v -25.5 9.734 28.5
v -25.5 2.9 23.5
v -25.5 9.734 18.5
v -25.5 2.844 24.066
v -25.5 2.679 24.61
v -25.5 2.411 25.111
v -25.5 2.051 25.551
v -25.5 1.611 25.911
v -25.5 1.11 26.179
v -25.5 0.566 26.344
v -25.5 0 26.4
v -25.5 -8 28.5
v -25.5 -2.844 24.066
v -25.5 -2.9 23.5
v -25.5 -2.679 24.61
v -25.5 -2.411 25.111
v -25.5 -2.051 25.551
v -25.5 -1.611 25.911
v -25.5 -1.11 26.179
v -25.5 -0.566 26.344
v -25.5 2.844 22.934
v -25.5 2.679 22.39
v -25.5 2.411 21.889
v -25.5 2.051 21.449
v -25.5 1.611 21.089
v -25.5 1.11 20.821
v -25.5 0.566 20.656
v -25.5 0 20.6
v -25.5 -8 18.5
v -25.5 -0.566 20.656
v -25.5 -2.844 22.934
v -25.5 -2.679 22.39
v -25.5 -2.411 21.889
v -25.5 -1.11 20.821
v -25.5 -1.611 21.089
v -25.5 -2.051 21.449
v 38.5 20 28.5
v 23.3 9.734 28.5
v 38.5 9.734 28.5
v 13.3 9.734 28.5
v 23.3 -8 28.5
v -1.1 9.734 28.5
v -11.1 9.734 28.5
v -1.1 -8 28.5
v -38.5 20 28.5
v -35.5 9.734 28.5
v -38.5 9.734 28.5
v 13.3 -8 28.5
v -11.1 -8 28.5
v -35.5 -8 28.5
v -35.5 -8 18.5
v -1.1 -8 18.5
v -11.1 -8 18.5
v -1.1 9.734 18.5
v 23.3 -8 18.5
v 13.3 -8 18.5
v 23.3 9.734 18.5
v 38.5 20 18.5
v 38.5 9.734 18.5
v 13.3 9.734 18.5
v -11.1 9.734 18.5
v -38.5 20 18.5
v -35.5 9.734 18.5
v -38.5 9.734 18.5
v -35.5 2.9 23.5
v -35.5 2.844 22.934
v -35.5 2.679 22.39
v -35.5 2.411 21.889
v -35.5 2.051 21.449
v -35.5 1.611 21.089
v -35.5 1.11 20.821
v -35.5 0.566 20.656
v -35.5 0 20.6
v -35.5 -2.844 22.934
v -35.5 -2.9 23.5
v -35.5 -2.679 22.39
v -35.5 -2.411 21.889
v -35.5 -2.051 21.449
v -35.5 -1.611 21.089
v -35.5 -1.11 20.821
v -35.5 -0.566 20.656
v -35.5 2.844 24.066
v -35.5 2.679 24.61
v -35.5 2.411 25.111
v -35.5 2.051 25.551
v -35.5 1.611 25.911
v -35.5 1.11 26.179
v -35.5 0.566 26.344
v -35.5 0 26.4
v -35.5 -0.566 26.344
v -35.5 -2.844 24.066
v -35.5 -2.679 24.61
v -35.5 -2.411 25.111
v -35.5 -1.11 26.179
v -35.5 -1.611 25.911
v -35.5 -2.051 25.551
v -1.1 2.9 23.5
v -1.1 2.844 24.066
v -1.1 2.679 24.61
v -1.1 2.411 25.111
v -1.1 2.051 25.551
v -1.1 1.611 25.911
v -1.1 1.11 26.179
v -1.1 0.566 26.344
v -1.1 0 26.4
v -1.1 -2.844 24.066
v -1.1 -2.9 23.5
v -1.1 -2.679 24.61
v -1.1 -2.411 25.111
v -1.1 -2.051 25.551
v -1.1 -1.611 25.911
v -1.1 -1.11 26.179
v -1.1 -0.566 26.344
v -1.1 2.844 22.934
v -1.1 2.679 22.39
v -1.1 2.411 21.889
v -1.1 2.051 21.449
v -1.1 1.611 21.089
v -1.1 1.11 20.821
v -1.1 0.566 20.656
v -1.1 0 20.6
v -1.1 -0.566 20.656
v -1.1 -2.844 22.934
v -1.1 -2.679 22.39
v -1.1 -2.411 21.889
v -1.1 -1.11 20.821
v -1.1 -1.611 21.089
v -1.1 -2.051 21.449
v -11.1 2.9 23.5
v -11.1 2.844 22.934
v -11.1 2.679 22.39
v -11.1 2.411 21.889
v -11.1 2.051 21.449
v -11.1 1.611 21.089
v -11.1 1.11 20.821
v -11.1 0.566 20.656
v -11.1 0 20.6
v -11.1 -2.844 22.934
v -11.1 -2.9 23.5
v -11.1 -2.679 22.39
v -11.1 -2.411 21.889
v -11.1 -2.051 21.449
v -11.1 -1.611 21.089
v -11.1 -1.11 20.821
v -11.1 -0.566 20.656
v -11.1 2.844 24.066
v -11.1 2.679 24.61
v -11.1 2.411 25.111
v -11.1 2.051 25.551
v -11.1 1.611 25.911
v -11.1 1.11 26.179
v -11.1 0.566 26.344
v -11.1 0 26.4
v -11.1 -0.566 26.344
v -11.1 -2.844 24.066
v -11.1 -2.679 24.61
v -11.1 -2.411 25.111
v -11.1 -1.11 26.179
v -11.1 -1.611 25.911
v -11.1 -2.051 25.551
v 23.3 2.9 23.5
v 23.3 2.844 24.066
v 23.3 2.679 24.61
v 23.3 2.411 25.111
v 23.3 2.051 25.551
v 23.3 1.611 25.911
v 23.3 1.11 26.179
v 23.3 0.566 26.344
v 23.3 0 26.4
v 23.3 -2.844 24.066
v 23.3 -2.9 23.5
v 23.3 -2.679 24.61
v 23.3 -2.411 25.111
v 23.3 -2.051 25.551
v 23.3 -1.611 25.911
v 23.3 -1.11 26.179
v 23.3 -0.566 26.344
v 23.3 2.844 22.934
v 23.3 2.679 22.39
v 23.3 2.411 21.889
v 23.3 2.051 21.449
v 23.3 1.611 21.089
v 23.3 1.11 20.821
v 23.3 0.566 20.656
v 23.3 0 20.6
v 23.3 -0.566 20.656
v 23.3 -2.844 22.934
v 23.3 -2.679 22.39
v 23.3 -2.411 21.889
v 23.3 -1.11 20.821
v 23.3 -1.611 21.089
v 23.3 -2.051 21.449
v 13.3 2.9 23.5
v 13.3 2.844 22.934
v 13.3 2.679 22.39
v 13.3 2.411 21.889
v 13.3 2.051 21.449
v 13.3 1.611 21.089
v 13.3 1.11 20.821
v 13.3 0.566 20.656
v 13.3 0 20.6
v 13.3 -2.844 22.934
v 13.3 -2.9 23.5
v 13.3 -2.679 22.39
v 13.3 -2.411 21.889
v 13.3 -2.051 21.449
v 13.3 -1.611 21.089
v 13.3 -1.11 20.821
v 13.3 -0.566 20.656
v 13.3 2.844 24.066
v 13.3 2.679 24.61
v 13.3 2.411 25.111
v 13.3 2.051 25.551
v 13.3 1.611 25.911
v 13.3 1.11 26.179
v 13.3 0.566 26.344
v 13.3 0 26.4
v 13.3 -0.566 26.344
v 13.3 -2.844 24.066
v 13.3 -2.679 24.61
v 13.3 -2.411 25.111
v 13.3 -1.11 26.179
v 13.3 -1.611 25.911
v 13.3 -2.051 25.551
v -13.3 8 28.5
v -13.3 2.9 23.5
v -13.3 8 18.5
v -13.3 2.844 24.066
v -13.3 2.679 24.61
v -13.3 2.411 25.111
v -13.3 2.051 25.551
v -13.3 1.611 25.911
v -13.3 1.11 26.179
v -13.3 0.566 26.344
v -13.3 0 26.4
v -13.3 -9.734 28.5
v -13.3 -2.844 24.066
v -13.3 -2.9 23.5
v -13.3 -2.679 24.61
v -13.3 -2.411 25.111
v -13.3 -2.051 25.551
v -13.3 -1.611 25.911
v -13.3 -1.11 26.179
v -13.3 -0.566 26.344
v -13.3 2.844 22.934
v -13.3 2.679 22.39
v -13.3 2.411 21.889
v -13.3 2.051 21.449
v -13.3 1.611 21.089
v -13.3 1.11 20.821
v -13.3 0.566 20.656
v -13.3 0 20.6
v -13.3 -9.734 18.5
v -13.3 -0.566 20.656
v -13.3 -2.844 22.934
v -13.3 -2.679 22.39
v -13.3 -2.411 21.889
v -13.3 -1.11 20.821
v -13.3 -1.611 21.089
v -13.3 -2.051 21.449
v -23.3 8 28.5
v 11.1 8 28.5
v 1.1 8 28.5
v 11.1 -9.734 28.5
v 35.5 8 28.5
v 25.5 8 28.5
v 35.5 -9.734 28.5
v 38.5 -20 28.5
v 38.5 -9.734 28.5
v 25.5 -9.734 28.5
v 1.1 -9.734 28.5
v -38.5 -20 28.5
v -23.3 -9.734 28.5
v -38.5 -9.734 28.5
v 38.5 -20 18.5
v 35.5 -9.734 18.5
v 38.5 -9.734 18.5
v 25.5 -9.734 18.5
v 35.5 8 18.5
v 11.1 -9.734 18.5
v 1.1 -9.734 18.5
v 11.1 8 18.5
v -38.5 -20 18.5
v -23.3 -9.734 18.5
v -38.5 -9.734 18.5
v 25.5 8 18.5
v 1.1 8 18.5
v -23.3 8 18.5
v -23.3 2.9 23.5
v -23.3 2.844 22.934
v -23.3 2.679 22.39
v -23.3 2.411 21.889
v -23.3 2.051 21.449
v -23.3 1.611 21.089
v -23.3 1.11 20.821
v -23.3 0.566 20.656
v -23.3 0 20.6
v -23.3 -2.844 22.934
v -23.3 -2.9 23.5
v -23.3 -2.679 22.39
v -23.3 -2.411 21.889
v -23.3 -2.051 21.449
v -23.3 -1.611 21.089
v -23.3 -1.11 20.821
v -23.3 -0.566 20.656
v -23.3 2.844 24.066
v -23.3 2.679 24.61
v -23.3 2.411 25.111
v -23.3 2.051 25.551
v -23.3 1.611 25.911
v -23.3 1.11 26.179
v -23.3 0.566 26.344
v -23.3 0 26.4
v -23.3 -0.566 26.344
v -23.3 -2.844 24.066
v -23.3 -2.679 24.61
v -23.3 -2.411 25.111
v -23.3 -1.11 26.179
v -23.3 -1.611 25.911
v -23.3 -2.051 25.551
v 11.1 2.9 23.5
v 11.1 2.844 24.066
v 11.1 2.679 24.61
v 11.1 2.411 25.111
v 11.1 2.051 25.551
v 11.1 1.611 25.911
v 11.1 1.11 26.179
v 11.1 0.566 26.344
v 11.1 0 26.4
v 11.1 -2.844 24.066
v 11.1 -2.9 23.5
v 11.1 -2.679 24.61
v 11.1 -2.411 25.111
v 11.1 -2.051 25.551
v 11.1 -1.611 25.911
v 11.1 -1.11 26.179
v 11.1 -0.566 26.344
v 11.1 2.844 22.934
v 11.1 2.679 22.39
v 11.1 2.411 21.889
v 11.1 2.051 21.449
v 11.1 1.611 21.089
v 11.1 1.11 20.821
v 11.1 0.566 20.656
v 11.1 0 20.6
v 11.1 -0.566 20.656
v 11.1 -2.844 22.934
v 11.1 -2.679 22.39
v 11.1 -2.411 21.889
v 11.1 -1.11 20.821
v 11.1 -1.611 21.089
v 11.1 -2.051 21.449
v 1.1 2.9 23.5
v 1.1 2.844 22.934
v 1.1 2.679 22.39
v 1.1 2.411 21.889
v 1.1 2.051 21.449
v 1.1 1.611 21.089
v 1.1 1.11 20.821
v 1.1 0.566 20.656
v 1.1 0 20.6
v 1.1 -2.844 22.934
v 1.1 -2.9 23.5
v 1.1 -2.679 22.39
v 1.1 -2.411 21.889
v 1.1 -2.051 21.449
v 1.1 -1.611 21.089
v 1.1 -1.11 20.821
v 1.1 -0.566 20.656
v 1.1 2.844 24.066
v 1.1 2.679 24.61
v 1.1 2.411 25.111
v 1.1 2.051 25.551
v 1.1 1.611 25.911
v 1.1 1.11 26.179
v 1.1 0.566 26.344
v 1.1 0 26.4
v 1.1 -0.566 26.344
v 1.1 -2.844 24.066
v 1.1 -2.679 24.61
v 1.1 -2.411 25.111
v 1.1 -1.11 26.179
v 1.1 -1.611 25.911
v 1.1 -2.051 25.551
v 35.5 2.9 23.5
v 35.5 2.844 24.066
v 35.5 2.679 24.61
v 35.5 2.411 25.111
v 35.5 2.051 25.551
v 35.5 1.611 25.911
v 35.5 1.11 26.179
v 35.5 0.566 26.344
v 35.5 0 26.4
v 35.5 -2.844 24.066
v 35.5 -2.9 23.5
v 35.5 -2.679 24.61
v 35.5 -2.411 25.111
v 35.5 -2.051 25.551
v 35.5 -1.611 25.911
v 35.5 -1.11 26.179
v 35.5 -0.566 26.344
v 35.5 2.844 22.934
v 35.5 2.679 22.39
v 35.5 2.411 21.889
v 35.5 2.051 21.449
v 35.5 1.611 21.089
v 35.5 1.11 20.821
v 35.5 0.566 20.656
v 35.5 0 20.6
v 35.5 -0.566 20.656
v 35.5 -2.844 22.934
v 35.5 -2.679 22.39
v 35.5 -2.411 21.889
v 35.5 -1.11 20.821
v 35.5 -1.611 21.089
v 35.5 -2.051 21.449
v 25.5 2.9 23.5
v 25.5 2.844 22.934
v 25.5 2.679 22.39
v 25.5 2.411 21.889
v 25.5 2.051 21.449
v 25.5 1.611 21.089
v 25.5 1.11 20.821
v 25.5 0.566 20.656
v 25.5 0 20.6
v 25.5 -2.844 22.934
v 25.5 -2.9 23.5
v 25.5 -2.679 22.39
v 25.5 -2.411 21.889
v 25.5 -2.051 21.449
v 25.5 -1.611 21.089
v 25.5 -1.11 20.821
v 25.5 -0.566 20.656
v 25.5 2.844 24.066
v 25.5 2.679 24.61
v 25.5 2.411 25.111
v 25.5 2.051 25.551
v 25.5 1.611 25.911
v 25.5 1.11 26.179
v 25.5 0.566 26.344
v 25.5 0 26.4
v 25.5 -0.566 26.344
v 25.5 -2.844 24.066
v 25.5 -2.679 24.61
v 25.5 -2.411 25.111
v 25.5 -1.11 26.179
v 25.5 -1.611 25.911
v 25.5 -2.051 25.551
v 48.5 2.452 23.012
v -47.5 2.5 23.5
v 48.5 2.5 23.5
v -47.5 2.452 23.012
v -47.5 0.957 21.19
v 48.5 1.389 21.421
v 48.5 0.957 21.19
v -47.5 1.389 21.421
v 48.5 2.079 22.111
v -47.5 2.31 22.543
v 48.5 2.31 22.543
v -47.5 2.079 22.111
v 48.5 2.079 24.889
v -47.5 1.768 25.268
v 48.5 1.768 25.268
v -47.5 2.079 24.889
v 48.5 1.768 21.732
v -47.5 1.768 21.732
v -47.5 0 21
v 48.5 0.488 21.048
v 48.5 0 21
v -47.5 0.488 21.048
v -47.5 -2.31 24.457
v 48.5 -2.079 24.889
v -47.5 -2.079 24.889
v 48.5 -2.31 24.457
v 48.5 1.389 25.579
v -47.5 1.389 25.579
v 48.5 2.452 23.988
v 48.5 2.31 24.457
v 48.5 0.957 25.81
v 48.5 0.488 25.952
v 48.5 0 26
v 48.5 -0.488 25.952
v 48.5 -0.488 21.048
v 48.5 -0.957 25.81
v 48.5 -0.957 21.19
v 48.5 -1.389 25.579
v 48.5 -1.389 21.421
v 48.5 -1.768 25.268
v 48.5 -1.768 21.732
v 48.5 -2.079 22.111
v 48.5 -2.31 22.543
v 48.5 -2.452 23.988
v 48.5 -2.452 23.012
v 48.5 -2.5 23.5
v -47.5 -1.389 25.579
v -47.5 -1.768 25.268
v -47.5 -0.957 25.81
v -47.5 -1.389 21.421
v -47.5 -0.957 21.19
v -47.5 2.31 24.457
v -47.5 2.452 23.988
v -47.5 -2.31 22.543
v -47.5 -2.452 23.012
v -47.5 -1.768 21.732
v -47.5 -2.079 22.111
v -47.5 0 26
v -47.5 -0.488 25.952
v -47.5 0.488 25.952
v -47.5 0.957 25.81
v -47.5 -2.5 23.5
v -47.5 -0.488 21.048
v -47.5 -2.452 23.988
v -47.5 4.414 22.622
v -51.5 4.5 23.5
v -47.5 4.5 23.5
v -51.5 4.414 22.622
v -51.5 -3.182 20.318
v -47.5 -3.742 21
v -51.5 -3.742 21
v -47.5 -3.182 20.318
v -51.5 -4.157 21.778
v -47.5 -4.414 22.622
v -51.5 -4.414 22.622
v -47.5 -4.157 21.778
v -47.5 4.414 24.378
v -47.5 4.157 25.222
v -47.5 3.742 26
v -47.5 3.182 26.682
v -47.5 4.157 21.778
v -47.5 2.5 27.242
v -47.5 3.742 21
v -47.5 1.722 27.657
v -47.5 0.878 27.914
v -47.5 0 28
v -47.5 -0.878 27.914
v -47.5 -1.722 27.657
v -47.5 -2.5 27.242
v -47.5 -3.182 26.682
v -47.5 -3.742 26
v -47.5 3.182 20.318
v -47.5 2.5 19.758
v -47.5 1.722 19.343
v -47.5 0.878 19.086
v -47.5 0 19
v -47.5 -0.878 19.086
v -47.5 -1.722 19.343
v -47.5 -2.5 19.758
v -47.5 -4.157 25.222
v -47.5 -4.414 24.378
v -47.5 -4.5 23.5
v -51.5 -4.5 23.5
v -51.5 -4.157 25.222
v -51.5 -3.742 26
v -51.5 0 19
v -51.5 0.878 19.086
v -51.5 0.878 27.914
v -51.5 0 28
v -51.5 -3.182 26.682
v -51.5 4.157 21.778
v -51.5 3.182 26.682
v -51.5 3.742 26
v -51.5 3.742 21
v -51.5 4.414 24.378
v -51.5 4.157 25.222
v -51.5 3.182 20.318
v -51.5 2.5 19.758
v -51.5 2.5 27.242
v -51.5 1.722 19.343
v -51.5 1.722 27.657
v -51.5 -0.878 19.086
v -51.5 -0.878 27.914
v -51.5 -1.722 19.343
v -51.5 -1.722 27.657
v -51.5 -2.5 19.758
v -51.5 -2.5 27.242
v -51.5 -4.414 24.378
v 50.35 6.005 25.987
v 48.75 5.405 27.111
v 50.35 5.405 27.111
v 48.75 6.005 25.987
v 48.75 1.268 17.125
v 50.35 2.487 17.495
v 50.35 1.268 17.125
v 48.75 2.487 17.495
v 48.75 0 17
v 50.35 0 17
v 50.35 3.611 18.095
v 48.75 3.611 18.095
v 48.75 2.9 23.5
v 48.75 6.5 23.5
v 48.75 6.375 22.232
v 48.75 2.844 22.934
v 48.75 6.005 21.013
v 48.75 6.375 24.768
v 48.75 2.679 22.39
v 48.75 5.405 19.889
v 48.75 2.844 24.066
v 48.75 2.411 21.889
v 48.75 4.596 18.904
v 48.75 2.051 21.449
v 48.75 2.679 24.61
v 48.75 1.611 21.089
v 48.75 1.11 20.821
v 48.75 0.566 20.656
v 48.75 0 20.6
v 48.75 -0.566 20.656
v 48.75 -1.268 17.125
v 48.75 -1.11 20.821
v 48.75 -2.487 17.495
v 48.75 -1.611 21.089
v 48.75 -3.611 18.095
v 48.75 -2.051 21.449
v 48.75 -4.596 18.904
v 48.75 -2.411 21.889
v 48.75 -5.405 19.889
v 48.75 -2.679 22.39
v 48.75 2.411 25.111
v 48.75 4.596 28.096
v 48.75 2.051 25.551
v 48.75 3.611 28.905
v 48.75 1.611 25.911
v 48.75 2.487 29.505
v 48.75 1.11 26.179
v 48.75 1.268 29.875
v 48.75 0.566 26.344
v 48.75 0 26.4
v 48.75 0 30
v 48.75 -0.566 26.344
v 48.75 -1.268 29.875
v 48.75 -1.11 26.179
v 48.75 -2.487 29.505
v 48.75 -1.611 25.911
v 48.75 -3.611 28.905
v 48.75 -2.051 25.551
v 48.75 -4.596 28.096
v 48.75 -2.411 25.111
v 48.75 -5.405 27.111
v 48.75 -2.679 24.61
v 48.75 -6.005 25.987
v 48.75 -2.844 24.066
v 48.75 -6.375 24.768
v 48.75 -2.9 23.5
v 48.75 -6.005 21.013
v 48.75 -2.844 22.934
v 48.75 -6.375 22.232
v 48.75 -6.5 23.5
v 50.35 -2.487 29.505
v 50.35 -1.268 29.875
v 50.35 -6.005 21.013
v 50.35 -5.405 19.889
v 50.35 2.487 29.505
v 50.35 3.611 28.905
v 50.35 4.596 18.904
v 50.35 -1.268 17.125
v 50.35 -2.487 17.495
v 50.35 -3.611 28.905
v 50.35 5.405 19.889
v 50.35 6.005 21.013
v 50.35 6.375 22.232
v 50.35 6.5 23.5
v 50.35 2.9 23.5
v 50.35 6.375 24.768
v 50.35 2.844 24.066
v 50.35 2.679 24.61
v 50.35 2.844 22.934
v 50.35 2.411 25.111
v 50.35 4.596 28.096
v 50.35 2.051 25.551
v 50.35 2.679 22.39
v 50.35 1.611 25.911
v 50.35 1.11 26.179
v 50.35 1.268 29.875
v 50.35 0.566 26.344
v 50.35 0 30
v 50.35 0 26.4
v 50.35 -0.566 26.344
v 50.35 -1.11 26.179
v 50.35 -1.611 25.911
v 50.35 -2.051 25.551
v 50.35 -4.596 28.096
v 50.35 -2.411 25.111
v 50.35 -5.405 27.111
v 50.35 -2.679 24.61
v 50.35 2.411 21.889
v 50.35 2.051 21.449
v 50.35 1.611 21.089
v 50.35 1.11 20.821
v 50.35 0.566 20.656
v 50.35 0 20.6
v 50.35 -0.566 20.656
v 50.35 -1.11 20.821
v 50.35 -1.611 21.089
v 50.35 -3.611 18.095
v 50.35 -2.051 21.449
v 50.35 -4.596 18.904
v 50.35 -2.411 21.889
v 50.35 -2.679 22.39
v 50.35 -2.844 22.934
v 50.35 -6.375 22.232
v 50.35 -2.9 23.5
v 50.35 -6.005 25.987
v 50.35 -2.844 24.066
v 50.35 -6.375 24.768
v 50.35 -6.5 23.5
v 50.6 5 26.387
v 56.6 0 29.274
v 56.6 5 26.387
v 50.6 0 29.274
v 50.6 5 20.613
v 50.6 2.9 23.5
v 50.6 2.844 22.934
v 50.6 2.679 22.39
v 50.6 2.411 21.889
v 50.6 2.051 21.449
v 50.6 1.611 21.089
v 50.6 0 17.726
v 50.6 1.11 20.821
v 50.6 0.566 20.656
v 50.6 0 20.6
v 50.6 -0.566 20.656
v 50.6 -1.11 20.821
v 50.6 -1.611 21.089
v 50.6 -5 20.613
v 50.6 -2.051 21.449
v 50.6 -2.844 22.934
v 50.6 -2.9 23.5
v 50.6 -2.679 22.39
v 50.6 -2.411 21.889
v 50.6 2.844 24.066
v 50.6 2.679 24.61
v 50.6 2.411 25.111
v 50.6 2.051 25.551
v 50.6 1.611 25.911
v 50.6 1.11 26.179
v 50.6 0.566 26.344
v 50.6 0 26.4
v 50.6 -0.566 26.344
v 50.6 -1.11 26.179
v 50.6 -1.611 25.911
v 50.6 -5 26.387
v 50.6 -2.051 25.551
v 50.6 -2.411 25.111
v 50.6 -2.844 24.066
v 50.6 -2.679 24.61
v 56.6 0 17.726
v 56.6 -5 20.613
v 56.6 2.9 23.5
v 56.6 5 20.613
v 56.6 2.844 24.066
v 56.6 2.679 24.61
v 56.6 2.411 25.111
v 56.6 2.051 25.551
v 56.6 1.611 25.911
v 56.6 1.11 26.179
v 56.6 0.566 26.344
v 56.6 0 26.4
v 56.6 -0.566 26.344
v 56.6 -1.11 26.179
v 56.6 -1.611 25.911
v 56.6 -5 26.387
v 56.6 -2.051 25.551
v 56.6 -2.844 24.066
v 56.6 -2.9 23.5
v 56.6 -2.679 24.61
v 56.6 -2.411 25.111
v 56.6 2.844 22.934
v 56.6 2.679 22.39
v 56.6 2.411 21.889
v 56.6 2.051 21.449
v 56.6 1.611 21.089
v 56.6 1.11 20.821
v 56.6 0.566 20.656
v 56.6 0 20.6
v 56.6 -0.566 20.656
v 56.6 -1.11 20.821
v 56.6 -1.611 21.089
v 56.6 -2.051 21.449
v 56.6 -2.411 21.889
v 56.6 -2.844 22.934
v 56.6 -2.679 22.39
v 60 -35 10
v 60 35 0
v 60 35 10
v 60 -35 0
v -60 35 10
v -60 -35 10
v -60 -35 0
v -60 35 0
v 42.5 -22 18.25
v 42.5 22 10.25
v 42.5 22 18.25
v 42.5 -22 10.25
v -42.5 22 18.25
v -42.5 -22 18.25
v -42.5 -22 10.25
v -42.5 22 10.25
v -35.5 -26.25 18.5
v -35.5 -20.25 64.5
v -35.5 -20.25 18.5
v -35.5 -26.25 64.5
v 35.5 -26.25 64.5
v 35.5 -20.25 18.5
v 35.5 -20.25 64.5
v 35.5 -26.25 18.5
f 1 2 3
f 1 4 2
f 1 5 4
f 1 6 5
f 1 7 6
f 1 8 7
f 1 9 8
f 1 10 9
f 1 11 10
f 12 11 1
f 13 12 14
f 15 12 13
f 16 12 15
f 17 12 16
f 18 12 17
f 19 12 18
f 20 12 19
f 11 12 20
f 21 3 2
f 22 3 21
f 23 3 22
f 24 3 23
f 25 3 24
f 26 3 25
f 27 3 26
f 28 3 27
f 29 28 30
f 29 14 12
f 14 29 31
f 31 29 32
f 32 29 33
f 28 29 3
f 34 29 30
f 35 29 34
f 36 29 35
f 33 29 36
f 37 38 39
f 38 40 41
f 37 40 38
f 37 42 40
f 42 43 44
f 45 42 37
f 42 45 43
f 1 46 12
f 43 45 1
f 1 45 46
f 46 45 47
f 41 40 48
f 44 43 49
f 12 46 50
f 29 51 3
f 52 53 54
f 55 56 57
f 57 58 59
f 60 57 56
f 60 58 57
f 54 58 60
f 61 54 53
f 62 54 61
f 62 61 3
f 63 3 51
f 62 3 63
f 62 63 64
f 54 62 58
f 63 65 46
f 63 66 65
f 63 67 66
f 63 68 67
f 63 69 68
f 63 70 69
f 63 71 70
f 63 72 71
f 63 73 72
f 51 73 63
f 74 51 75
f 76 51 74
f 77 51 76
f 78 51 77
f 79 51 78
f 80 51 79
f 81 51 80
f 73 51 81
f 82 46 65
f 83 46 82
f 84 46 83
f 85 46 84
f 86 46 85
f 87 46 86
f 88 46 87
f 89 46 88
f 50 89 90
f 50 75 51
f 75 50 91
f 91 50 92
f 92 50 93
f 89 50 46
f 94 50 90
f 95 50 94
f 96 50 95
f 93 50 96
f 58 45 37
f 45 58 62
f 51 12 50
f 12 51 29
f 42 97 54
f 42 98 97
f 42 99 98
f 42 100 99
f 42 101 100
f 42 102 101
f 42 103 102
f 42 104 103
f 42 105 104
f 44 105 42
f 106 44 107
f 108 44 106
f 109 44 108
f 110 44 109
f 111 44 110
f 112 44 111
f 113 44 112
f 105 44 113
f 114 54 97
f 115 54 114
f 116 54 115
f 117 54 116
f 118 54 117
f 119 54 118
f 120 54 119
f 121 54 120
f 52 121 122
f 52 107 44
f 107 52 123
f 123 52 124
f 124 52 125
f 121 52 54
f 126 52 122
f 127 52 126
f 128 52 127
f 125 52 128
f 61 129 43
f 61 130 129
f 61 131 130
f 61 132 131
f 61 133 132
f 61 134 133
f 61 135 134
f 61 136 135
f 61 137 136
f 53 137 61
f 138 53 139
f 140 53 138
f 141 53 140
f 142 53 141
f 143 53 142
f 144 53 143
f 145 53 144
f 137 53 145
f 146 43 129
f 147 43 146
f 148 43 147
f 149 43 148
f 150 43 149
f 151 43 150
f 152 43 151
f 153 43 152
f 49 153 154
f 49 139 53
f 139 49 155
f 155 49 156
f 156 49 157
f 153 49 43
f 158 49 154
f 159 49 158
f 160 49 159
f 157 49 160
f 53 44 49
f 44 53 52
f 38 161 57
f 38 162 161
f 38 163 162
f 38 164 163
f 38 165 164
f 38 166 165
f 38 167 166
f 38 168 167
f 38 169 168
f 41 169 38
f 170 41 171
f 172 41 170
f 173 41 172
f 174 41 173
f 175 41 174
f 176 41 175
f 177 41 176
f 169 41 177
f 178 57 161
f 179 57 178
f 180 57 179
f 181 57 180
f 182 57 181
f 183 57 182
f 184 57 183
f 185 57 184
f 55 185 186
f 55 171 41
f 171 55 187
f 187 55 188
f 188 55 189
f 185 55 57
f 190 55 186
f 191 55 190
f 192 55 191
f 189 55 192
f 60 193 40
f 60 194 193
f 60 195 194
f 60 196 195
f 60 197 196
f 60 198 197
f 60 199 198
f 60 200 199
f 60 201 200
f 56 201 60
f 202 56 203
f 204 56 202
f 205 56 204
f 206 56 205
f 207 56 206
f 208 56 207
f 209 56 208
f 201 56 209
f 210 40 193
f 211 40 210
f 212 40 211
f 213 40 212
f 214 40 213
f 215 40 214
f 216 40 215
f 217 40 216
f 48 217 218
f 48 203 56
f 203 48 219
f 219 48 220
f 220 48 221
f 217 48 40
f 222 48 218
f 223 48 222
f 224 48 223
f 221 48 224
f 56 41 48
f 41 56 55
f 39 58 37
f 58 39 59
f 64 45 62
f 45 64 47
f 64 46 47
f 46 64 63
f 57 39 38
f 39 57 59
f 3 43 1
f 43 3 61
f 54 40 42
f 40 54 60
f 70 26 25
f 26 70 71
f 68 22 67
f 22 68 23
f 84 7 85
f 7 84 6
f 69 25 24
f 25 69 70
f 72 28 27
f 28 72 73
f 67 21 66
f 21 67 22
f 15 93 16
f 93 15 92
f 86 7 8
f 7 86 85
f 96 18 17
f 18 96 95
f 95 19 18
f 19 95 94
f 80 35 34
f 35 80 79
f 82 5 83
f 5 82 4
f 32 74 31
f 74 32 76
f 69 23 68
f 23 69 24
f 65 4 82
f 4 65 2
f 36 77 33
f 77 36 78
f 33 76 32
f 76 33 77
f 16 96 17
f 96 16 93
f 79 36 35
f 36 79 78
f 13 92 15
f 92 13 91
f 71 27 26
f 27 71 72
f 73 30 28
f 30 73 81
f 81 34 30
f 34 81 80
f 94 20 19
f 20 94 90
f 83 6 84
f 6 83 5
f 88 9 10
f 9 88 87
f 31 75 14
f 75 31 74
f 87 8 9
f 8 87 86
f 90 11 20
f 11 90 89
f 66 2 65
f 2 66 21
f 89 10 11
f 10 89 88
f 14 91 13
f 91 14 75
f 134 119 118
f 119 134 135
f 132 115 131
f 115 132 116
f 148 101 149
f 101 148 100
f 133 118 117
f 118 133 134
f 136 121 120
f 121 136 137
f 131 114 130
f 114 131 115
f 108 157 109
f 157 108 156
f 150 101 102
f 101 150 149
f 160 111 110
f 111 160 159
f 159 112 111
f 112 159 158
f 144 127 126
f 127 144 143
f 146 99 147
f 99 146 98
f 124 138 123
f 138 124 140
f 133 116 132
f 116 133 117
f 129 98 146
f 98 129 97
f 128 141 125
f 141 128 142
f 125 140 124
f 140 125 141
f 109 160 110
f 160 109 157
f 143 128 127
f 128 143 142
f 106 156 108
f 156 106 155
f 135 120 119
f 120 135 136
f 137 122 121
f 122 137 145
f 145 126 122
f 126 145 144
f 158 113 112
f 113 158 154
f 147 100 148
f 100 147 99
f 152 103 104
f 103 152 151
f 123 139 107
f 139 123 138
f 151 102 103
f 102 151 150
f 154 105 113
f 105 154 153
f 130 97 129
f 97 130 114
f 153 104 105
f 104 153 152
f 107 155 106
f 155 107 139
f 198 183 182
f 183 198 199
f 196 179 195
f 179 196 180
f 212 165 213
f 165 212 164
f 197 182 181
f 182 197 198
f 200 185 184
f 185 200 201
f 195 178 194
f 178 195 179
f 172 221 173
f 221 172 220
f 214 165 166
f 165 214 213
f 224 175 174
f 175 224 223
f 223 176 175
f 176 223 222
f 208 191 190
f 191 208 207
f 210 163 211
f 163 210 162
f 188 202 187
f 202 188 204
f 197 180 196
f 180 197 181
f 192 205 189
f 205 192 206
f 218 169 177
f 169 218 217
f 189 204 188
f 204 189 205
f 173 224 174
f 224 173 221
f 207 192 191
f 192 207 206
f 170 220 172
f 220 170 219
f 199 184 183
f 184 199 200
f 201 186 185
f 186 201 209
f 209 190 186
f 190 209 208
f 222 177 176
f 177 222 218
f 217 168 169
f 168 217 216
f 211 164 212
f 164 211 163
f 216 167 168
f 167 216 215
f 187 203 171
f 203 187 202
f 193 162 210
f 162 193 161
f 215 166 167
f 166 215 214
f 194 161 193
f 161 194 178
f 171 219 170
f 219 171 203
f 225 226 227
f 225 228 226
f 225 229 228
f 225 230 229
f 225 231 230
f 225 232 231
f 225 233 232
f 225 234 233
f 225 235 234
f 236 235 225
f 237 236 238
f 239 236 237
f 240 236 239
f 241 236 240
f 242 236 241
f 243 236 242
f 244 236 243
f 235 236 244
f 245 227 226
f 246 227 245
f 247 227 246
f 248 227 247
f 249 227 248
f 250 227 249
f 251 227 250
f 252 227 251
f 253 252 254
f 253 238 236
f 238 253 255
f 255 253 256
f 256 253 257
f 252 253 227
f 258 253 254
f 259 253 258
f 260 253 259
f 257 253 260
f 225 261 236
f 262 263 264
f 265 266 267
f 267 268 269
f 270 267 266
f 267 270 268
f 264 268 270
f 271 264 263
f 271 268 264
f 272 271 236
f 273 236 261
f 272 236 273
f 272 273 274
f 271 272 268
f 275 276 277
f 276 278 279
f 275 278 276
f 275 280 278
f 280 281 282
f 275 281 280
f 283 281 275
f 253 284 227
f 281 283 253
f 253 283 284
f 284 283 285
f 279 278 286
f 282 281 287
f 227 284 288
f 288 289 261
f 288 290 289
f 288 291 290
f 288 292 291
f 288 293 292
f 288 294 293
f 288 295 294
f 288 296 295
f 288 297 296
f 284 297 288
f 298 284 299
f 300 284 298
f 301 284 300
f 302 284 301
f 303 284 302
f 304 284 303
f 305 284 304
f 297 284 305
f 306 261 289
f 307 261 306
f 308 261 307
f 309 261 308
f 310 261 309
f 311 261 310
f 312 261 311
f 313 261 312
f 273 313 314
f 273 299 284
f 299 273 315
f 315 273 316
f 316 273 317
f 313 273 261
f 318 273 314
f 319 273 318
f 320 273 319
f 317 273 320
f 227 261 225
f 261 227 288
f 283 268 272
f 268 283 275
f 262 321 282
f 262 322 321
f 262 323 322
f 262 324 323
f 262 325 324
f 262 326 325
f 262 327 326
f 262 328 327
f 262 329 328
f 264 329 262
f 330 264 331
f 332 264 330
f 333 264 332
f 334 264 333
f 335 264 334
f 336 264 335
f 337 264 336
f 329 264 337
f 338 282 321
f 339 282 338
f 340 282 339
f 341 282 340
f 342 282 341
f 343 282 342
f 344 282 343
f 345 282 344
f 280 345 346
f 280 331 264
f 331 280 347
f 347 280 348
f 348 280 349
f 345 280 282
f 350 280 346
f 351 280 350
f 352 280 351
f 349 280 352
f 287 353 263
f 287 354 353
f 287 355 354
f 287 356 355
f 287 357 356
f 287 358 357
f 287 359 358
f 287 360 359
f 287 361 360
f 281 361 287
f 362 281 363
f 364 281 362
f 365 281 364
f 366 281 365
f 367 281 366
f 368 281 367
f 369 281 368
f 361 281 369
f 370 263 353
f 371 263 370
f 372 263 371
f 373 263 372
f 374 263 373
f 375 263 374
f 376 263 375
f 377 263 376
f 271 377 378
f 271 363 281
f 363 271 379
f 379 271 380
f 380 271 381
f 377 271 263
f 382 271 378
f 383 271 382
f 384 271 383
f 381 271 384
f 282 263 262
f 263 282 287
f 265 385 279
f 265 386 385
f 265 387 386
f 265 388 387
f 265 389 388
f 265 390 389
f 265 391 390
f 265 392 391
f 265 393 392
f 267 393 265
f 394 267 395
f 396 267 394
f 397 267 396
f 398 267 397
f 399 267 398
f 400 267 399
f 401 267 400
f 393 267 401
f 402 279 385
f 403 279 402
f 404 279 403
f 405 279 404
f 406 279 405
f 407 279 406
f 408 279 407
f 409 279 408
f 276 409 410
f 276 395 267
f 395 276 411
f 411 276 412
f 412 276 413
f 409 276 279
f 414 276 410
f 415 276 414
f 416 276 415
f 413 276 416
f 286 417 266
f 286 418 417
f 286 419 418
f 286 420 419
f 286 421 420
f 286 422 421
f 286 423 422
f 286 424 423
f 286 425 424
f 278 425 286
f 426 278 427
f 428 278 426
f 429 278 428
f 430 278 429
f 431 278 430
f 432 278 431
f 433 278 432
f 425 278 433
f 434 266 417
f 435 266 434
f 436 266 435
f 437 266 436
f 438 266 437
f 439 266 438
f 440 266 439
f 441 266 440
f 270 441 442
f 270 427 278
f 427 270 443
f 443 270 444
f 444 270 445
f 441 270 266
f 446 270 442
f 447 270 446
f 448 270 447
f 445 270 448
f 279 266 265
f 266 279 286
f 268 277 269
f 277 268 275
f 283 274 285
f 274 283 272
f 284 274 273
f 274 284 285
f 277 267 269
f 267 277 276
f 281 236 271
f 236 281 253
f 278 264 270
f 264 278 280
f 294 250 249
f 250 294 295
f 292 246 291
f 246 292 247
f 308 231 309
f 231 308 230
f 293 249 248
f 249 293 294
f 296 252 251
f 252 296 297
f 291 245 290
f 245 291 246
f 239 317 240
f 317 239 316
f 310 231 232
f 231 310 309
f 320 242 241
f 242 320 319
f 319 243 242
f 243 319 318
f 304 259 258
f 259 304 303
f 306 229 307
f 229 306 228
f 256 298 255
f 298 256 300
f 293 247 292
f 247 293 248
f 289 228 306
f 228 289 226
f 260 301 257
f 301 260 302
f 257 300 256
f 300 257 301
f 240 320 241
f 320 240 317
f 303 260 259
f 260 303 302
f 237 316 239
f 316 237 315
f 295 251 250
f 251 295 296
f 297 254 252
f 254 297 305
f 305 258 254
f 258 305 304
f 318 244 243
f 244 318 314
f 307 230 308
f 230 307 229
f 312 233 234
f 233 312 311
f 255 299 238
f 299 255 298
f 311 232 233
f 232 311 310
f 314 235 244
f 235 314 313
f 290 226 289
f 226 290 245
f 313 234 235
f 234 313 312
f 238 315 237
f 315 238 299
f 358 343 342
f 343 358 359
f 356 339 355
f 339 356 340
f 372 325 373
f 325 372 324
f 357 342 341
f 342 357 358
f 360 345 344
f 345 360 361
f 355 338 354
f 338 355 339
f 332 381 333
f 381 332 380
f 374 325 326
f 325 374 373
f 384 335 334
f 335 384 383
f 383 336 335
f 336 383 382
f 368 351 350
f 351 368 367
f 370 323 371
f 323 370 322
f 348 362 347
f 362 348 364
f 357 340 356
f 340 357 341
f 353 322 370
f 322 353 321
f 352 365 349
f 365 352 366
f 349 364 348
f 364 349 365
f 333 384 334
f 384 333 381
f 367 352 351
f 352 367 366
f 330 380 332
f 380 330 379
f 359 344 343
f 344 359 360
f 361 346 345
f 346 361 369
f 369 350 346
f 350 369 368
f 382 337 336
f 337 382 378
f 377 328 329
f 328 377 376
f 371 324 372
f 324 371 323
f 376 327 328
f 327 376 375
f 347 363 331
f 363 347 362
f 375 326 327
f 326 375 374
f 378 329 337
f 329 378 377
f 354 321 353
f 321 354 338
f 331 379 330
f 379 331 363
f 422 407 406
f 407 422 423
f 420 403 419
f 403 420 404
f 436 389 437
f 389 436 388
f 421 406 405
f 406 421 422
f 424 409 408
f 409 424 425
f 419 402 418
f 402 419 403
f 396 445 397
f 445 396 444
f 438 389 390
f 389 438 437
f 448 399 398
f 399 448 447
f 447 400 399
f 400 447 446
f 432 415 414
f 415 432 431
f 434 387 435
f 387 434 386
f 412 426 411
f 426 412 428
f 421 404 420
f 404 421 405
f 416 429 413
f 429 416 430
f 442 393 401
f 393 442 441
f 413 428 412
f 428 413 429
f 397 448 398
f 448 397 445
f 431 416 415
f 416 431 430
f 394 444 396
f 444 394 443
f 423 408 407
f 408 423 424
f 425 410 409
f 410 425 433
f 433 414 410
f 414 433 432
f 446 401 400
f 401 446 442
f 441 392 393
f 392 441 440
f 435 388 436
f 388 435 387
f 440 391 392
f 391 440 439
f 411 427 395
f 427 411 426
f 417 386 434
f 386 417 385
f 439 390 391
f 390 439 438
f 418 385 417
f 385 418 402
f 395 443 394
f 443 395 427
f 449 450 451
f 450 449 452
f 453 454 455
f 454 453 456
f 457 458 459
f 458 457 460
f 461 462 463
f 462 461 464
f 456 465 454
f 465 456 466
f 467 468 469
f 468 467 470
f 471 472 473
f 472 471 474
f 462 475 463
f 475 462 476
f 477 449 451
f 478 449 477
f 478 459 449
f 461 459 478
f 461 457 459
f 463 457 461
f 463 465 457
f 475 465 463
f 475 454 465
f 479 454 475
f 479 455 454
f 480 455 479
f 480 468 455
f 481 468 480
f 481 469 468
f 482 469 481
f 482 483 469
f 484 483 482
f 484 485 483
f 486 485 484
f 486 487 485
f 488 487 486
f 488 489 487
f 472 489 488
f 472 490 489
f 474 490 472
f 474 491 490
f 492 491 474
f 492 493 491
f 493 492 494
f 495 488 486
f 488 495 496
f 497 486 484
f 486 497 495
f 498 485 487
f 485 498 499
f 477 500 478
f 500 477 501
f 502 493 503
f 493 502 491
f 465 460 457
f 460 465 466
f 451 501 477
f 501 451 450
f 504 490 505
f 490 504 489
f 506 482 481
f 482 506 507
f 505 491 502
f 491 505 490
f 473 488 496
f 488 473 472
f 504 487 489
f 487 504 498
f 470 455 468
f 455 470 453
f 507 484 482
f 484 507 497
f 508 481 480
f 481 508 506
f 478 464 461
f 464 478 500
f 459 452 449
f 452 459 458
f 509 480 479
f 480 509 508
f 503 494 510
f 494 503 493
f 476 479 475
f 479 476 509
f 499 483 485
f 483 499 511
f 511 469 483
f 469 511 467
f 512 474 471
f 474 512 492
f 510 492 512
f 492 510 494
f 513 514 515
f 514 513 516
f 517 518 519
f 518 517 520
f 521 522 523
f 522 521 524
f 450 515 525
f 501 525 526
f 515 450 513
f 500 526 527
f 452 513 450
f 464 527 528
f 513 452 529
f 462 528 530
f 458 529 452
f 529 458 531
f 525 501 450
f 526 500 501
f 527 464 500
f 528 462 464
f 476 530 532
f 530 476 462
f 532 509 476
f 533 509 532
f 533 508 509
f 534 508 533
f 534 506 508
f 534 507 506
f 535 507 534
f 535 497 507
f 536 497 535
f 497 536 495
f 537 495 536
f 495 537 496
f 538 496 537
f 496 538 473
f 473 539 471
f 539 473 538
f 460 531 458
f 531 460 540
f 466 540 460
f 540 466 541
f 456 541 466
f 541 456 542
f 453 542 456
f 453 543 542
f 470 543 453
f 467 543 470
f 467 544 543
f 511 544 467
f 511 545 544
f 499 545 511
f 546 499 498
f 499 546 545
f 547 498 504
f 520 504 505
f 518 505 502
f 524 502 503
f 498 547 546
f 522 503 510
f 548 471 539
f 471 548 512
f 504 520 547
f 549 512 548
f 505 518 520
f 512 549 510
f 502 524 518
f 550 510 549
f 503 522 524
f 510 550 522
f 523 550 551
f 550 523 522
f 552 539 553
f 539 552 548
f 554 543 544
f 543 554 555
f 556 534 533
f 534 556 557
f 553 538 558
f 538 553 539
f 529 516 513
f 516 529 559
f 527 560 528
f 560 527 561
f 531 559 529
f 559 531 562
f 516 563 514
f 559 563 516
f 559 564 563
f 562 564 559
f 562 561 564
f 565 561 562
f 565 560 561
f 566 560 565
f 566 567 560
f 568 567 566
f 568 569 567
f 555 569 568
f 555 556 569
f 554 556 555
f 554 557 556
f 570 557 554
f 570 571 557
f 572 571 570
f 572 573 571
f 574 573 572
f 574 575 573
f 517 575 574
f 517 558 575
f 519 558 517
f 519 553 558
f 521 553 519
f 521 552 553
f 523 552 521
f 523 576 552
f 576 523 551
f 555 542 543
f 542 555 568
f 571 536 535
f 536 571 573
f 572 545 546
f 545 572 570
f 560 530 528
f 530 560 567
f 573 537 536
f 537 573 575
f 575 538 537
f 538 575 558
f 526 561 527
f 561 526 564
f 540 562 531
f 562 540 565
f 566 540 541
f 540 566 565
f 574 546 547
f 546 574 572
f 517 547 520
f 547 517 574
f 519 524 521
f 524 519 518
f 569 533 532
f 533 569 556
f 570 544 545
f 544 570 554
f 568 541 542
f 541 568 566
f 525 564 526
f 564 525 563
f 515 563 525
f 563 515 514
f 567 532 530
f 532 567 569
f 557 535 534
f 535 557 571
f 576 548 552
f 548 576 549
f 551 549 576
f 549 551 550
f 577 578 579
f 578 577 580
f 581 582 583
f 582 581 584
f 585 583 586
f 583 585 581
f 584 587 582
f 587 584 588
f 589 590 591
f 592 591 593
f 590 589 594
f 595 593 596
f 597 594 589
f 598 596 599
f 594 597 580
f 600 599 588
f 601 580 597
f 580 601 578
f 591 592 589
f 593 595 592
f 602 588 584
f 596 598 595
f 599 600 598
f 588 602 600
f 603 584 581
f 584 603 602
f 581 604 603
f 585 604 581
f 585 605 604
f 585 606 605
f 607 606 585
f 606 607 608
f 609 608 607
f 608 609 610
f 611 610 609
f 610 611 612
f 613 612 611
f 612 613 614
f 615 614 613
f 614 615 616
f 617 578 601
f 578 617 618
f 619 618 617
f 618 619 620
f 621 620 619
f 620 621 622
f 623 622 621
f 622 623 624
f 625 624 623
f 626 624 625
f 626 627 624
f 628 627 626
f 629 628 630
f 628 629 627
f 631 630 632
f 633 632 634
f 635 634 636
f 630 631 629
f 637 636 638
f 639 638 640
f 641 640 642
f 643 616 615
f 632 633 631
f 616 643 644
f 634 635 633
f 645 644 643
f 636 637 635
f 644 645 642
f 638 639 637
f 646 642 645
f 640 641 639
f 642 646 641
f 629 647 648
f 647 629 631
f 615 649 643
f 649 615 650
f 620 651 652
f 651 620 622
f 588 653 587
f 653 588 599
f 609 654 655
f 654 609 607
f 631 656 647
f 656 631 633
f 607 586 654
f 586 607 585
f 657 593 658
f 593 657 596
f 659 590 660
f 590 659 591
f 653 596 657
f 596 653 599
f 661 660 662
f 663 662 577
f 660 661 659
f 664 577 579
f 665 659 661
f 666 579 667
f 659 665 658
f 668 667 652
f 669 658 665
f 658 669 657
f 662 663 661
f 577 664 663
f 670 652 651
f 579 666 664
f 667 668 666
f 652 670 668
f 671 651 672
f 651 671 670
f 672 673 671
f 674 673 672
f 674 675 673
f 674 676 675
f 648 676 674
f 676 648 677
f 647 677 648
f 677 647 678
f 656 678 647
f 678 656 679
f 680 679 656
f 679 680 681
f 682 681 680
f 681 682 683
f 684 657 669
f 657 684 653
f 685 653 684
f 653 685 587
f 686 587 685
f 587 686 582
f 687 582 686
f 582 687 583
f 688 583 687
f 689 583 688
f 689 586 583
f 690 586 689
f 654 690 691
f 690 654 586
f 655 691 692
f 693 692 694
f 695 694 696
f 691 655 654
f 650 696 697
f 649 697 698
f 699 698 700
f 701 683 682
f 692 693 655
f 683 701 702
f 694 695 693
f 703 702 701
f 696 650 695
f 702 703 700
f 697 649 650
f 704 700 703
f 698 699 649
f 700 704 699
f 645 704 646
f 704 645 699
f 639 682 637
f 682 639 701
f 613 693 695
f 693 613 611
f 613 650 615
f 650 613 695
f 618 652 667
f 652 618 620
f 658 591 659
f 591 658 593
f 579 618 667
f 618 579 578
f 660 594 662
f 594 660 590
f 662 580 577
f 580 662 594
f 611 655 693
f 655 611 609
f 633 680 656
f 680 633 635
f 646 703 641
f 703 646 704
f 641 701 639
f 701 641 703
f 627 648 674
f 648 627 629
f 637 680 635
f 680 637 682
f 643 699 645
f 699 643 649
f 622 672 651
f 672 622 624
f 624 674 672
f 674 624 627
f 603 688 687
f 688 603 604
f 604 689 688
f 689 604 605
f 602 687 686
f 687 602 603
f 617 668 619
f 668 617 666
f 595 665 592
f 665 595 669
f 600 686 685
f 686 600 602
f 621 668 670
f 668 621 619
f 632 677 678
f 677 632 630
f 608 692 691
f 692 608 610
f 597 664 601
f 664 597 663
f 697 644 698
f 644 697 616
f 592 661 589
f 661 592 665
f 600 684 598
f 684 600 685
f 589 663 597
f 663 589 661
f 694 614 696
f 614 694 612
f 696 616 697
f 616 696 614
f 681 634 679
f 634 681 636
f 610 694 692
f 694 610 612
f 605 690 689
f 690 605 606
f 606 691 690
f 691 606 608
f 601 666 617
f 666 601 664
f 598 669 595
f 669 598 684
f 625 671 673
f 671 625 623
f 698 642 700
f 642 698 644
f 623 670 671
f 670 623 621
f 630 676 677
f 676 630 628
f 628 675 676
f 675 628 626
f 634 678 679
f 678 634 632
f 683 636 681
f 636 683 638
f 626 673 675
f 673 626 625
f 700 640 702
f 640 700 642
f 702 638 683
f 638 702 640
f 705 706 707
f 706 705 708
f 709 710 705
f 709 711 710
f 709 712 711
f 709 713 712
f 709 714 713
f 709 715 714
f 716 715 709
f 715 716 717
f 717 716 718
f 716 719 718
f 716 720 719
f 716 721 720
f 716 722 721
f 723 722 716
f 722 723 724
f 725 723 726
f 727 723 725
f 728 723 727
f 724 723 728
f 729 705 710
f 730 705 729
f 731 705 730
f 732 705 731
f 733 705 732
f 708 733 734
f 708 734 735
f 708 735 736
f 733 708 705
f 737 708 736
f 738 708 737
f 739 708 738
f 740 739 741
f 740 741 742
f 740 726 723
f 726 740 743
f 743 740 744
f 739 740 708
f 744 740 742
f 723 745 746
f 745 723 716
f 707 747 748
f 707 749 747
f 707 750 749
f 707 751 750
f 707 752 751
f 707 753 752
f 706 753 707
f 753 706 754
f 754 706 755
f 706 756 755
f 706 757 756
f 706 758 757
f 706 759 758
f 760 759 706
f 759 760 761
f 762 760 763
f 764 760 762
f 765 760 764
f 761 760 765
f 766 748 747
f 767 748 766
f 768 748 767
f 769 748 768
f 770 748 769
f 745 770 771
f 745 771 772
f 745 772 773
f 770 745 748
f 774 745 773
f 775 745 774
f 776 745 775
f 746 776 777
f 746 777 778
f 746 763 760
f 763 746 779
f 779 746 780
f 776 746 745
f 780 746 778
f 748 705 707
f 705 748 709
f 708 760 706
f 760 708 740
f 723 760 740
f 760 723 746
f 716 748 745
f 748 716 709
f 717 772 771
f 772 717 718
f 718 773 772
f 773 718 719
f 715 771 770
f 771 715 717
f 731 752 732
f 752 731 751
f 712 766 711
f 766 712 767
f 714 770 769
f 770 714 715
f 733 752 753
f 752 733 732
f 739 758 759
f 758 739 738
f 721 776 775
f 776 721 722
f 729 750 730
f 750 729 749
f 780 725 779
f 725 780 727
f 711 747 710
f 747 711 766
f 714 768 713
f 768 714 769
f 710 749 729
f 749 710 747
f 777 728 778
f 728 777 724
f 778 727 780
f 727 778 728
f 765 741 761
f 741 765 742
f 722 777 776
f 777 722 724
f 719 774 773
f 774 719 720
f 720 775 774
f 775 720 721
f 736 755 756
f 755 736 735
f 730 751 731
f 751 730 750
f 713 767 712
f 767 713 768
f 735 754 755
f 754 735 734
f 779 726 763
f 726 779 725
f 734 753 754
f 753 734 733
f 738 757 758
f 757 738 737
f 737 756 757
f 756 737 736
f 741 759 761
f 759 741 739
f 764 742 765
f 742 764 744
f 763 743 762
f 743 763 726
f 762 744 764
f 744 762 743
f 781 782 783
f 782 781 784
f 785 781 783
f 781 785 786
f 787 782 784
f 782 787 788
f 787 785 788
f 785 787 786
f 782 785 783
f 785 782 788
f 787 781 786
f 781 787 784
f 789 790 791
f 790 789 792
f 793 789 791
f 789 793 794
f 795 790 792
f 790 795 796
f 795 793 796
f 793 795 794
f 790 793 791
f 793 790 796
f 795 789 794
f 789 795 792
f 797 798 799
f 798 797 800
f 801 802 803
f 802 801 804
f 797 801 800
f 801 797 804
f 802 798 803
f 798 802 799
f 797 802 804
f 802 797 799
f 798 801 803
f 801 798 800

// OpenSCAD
$fn = 32;

// ------------------------------------------------------------------------
// Comb hinge with flap: leaf 77 x 20 mm, pin d5, flap 46 mm
// Every part is its own module, assembly() places every instance.
// ------------------------------------------------------------------------

// --- part 1 ---
module hinge_bed() {
  difference() {
    translate([-60, -35, 0]) cube([120, 70, 10]);
  }
}

// --- part 2 ---
module hinge_riser() {
  difference() {
    translate([-42.5, -22, 0]) cube([85, 44, 8]);
  }
}

// --- part 3 ---
module hinge_leaf_a() {
  difference() {
    union() {
      translate([-35.5, -8, -5]) cube([10, 28, 10]);
      translate([-11.1, -8, -5]) cube([10, 28, 10]);
      translate([13.3, -8, -5]) cube([10, 28, 10]);
      translate([-38.5, 9.734, -5]) cube([77, 10.266, 10]);
    }
    translate([-30.5, 0, 0]) rotate([0, 90, 0]) cylinder(h = 12, d = 5.8, center = true);
    translate([-6.1, 0, 0]) rotate([0, 90, 0]) cylinder(h = 12, d = 5.8, center = true);
    translate([18.3, 0, 0]) rotate([0, 90, 0]) cylinder(h = 12, d = 5.8, center = true);
  }
}

// --- part 4 ---
module hinge_leaf_b() {
  difference() {
    union() {
      translate([-23.3, -20, -5]) cube([10, 28, 10]);
      translate([1.1, -20, -5]) cube([10, 28, 10]);
      translate([25.5, -20, -5]) cube([10, 28, 10]);
      translate([-38.5, -20, -5]) cube([77, 10.266, 10]);
    }
    translate([-18.3, 0, 0]) rotate([0, 90, 0]) cylinder(h = 12, d = 5.8, center = true);
    translate([6.1, 0, 0]) rotate([0, 90, 0]) cylinder(h = 12, d = 5.8, center = true);
    translate([30.5, 0, 0]) rotate([0, 90, 0]) cylinder(h = 12, d = 5.8, center = true);
  }
}

// --- part 5 ---
module hinge_flap() {
  difference() {
    translate([-35.5, -23, 0]) cube([71, 46, 6]);
  }
}

// --- part 6 ---
module hinge_pin() {
  rotate([0, 90, 0]) cylinder(h = 97, d = 5, center = true);
  translate([-51.5, 0, 0]) rotate([0, 90, 0]) cylinder(h = 4, d = 9);
}

// --- part 7 ---
module pin_washer() {
  difference() {
      translate([0, 0, 0]) cylinder(h = 1.6, d = 13);
      translate([0, 0, -1]) cylinder(h = 3.6, d = 5.8);
    }
}

// --- part 8 ---
module pin_nut() {
  difference() {
    linear_extrude(height = 6) polygon(points = [[5.774, 0], [2.887, 5], [-2.887, 5], [-5.774, 0], [-2.887, -5], [2.887, -5]]);
    translate([0, 0, -1]) cylinder(h = 8, d = 5.8);
  }
}

// --- assembly ---
module assembly() {
  color([0.80, 0.24, 0.20]) translate([0, 0, 0]) rotate([0, 0, 0]) hinge_bed();
  color([0.20, 0.45, 0.75]) translate([0, 0, 10.25]) rotate([0, 0, 0]) hinge_riser();
  color([0.25, 0.62, 0.32]) translate([0, 0, 23.5]) rotate([0, 0, 0]) hinge_leaf_a();
  color([0.92, 0.70, 0.18]) translate([0, 0, 23.5]) rotate([0, 0, 0]) hinge_leaf_b();
  color([0.58, 0.35, 0.70]) translate([0, -20.25, 41.5]) rotate([90, 0, 0]) hinge_flap();
  color([0.16, 0.66, 0.66]) translate([0, 0, 23.5]) rotate([0, 0, 0]) hinge_pin();
  color([0.85, 0.48, 0.18]) translate([48.75, 0, 23.5]) rotate([0, 90, 0]) pin_washer();
  color([0.55, 0.60, 0.65]) translate([50.6, 0, 23.5]) rotate([0, 90, 0]) pin_nut();
}

assembly();
